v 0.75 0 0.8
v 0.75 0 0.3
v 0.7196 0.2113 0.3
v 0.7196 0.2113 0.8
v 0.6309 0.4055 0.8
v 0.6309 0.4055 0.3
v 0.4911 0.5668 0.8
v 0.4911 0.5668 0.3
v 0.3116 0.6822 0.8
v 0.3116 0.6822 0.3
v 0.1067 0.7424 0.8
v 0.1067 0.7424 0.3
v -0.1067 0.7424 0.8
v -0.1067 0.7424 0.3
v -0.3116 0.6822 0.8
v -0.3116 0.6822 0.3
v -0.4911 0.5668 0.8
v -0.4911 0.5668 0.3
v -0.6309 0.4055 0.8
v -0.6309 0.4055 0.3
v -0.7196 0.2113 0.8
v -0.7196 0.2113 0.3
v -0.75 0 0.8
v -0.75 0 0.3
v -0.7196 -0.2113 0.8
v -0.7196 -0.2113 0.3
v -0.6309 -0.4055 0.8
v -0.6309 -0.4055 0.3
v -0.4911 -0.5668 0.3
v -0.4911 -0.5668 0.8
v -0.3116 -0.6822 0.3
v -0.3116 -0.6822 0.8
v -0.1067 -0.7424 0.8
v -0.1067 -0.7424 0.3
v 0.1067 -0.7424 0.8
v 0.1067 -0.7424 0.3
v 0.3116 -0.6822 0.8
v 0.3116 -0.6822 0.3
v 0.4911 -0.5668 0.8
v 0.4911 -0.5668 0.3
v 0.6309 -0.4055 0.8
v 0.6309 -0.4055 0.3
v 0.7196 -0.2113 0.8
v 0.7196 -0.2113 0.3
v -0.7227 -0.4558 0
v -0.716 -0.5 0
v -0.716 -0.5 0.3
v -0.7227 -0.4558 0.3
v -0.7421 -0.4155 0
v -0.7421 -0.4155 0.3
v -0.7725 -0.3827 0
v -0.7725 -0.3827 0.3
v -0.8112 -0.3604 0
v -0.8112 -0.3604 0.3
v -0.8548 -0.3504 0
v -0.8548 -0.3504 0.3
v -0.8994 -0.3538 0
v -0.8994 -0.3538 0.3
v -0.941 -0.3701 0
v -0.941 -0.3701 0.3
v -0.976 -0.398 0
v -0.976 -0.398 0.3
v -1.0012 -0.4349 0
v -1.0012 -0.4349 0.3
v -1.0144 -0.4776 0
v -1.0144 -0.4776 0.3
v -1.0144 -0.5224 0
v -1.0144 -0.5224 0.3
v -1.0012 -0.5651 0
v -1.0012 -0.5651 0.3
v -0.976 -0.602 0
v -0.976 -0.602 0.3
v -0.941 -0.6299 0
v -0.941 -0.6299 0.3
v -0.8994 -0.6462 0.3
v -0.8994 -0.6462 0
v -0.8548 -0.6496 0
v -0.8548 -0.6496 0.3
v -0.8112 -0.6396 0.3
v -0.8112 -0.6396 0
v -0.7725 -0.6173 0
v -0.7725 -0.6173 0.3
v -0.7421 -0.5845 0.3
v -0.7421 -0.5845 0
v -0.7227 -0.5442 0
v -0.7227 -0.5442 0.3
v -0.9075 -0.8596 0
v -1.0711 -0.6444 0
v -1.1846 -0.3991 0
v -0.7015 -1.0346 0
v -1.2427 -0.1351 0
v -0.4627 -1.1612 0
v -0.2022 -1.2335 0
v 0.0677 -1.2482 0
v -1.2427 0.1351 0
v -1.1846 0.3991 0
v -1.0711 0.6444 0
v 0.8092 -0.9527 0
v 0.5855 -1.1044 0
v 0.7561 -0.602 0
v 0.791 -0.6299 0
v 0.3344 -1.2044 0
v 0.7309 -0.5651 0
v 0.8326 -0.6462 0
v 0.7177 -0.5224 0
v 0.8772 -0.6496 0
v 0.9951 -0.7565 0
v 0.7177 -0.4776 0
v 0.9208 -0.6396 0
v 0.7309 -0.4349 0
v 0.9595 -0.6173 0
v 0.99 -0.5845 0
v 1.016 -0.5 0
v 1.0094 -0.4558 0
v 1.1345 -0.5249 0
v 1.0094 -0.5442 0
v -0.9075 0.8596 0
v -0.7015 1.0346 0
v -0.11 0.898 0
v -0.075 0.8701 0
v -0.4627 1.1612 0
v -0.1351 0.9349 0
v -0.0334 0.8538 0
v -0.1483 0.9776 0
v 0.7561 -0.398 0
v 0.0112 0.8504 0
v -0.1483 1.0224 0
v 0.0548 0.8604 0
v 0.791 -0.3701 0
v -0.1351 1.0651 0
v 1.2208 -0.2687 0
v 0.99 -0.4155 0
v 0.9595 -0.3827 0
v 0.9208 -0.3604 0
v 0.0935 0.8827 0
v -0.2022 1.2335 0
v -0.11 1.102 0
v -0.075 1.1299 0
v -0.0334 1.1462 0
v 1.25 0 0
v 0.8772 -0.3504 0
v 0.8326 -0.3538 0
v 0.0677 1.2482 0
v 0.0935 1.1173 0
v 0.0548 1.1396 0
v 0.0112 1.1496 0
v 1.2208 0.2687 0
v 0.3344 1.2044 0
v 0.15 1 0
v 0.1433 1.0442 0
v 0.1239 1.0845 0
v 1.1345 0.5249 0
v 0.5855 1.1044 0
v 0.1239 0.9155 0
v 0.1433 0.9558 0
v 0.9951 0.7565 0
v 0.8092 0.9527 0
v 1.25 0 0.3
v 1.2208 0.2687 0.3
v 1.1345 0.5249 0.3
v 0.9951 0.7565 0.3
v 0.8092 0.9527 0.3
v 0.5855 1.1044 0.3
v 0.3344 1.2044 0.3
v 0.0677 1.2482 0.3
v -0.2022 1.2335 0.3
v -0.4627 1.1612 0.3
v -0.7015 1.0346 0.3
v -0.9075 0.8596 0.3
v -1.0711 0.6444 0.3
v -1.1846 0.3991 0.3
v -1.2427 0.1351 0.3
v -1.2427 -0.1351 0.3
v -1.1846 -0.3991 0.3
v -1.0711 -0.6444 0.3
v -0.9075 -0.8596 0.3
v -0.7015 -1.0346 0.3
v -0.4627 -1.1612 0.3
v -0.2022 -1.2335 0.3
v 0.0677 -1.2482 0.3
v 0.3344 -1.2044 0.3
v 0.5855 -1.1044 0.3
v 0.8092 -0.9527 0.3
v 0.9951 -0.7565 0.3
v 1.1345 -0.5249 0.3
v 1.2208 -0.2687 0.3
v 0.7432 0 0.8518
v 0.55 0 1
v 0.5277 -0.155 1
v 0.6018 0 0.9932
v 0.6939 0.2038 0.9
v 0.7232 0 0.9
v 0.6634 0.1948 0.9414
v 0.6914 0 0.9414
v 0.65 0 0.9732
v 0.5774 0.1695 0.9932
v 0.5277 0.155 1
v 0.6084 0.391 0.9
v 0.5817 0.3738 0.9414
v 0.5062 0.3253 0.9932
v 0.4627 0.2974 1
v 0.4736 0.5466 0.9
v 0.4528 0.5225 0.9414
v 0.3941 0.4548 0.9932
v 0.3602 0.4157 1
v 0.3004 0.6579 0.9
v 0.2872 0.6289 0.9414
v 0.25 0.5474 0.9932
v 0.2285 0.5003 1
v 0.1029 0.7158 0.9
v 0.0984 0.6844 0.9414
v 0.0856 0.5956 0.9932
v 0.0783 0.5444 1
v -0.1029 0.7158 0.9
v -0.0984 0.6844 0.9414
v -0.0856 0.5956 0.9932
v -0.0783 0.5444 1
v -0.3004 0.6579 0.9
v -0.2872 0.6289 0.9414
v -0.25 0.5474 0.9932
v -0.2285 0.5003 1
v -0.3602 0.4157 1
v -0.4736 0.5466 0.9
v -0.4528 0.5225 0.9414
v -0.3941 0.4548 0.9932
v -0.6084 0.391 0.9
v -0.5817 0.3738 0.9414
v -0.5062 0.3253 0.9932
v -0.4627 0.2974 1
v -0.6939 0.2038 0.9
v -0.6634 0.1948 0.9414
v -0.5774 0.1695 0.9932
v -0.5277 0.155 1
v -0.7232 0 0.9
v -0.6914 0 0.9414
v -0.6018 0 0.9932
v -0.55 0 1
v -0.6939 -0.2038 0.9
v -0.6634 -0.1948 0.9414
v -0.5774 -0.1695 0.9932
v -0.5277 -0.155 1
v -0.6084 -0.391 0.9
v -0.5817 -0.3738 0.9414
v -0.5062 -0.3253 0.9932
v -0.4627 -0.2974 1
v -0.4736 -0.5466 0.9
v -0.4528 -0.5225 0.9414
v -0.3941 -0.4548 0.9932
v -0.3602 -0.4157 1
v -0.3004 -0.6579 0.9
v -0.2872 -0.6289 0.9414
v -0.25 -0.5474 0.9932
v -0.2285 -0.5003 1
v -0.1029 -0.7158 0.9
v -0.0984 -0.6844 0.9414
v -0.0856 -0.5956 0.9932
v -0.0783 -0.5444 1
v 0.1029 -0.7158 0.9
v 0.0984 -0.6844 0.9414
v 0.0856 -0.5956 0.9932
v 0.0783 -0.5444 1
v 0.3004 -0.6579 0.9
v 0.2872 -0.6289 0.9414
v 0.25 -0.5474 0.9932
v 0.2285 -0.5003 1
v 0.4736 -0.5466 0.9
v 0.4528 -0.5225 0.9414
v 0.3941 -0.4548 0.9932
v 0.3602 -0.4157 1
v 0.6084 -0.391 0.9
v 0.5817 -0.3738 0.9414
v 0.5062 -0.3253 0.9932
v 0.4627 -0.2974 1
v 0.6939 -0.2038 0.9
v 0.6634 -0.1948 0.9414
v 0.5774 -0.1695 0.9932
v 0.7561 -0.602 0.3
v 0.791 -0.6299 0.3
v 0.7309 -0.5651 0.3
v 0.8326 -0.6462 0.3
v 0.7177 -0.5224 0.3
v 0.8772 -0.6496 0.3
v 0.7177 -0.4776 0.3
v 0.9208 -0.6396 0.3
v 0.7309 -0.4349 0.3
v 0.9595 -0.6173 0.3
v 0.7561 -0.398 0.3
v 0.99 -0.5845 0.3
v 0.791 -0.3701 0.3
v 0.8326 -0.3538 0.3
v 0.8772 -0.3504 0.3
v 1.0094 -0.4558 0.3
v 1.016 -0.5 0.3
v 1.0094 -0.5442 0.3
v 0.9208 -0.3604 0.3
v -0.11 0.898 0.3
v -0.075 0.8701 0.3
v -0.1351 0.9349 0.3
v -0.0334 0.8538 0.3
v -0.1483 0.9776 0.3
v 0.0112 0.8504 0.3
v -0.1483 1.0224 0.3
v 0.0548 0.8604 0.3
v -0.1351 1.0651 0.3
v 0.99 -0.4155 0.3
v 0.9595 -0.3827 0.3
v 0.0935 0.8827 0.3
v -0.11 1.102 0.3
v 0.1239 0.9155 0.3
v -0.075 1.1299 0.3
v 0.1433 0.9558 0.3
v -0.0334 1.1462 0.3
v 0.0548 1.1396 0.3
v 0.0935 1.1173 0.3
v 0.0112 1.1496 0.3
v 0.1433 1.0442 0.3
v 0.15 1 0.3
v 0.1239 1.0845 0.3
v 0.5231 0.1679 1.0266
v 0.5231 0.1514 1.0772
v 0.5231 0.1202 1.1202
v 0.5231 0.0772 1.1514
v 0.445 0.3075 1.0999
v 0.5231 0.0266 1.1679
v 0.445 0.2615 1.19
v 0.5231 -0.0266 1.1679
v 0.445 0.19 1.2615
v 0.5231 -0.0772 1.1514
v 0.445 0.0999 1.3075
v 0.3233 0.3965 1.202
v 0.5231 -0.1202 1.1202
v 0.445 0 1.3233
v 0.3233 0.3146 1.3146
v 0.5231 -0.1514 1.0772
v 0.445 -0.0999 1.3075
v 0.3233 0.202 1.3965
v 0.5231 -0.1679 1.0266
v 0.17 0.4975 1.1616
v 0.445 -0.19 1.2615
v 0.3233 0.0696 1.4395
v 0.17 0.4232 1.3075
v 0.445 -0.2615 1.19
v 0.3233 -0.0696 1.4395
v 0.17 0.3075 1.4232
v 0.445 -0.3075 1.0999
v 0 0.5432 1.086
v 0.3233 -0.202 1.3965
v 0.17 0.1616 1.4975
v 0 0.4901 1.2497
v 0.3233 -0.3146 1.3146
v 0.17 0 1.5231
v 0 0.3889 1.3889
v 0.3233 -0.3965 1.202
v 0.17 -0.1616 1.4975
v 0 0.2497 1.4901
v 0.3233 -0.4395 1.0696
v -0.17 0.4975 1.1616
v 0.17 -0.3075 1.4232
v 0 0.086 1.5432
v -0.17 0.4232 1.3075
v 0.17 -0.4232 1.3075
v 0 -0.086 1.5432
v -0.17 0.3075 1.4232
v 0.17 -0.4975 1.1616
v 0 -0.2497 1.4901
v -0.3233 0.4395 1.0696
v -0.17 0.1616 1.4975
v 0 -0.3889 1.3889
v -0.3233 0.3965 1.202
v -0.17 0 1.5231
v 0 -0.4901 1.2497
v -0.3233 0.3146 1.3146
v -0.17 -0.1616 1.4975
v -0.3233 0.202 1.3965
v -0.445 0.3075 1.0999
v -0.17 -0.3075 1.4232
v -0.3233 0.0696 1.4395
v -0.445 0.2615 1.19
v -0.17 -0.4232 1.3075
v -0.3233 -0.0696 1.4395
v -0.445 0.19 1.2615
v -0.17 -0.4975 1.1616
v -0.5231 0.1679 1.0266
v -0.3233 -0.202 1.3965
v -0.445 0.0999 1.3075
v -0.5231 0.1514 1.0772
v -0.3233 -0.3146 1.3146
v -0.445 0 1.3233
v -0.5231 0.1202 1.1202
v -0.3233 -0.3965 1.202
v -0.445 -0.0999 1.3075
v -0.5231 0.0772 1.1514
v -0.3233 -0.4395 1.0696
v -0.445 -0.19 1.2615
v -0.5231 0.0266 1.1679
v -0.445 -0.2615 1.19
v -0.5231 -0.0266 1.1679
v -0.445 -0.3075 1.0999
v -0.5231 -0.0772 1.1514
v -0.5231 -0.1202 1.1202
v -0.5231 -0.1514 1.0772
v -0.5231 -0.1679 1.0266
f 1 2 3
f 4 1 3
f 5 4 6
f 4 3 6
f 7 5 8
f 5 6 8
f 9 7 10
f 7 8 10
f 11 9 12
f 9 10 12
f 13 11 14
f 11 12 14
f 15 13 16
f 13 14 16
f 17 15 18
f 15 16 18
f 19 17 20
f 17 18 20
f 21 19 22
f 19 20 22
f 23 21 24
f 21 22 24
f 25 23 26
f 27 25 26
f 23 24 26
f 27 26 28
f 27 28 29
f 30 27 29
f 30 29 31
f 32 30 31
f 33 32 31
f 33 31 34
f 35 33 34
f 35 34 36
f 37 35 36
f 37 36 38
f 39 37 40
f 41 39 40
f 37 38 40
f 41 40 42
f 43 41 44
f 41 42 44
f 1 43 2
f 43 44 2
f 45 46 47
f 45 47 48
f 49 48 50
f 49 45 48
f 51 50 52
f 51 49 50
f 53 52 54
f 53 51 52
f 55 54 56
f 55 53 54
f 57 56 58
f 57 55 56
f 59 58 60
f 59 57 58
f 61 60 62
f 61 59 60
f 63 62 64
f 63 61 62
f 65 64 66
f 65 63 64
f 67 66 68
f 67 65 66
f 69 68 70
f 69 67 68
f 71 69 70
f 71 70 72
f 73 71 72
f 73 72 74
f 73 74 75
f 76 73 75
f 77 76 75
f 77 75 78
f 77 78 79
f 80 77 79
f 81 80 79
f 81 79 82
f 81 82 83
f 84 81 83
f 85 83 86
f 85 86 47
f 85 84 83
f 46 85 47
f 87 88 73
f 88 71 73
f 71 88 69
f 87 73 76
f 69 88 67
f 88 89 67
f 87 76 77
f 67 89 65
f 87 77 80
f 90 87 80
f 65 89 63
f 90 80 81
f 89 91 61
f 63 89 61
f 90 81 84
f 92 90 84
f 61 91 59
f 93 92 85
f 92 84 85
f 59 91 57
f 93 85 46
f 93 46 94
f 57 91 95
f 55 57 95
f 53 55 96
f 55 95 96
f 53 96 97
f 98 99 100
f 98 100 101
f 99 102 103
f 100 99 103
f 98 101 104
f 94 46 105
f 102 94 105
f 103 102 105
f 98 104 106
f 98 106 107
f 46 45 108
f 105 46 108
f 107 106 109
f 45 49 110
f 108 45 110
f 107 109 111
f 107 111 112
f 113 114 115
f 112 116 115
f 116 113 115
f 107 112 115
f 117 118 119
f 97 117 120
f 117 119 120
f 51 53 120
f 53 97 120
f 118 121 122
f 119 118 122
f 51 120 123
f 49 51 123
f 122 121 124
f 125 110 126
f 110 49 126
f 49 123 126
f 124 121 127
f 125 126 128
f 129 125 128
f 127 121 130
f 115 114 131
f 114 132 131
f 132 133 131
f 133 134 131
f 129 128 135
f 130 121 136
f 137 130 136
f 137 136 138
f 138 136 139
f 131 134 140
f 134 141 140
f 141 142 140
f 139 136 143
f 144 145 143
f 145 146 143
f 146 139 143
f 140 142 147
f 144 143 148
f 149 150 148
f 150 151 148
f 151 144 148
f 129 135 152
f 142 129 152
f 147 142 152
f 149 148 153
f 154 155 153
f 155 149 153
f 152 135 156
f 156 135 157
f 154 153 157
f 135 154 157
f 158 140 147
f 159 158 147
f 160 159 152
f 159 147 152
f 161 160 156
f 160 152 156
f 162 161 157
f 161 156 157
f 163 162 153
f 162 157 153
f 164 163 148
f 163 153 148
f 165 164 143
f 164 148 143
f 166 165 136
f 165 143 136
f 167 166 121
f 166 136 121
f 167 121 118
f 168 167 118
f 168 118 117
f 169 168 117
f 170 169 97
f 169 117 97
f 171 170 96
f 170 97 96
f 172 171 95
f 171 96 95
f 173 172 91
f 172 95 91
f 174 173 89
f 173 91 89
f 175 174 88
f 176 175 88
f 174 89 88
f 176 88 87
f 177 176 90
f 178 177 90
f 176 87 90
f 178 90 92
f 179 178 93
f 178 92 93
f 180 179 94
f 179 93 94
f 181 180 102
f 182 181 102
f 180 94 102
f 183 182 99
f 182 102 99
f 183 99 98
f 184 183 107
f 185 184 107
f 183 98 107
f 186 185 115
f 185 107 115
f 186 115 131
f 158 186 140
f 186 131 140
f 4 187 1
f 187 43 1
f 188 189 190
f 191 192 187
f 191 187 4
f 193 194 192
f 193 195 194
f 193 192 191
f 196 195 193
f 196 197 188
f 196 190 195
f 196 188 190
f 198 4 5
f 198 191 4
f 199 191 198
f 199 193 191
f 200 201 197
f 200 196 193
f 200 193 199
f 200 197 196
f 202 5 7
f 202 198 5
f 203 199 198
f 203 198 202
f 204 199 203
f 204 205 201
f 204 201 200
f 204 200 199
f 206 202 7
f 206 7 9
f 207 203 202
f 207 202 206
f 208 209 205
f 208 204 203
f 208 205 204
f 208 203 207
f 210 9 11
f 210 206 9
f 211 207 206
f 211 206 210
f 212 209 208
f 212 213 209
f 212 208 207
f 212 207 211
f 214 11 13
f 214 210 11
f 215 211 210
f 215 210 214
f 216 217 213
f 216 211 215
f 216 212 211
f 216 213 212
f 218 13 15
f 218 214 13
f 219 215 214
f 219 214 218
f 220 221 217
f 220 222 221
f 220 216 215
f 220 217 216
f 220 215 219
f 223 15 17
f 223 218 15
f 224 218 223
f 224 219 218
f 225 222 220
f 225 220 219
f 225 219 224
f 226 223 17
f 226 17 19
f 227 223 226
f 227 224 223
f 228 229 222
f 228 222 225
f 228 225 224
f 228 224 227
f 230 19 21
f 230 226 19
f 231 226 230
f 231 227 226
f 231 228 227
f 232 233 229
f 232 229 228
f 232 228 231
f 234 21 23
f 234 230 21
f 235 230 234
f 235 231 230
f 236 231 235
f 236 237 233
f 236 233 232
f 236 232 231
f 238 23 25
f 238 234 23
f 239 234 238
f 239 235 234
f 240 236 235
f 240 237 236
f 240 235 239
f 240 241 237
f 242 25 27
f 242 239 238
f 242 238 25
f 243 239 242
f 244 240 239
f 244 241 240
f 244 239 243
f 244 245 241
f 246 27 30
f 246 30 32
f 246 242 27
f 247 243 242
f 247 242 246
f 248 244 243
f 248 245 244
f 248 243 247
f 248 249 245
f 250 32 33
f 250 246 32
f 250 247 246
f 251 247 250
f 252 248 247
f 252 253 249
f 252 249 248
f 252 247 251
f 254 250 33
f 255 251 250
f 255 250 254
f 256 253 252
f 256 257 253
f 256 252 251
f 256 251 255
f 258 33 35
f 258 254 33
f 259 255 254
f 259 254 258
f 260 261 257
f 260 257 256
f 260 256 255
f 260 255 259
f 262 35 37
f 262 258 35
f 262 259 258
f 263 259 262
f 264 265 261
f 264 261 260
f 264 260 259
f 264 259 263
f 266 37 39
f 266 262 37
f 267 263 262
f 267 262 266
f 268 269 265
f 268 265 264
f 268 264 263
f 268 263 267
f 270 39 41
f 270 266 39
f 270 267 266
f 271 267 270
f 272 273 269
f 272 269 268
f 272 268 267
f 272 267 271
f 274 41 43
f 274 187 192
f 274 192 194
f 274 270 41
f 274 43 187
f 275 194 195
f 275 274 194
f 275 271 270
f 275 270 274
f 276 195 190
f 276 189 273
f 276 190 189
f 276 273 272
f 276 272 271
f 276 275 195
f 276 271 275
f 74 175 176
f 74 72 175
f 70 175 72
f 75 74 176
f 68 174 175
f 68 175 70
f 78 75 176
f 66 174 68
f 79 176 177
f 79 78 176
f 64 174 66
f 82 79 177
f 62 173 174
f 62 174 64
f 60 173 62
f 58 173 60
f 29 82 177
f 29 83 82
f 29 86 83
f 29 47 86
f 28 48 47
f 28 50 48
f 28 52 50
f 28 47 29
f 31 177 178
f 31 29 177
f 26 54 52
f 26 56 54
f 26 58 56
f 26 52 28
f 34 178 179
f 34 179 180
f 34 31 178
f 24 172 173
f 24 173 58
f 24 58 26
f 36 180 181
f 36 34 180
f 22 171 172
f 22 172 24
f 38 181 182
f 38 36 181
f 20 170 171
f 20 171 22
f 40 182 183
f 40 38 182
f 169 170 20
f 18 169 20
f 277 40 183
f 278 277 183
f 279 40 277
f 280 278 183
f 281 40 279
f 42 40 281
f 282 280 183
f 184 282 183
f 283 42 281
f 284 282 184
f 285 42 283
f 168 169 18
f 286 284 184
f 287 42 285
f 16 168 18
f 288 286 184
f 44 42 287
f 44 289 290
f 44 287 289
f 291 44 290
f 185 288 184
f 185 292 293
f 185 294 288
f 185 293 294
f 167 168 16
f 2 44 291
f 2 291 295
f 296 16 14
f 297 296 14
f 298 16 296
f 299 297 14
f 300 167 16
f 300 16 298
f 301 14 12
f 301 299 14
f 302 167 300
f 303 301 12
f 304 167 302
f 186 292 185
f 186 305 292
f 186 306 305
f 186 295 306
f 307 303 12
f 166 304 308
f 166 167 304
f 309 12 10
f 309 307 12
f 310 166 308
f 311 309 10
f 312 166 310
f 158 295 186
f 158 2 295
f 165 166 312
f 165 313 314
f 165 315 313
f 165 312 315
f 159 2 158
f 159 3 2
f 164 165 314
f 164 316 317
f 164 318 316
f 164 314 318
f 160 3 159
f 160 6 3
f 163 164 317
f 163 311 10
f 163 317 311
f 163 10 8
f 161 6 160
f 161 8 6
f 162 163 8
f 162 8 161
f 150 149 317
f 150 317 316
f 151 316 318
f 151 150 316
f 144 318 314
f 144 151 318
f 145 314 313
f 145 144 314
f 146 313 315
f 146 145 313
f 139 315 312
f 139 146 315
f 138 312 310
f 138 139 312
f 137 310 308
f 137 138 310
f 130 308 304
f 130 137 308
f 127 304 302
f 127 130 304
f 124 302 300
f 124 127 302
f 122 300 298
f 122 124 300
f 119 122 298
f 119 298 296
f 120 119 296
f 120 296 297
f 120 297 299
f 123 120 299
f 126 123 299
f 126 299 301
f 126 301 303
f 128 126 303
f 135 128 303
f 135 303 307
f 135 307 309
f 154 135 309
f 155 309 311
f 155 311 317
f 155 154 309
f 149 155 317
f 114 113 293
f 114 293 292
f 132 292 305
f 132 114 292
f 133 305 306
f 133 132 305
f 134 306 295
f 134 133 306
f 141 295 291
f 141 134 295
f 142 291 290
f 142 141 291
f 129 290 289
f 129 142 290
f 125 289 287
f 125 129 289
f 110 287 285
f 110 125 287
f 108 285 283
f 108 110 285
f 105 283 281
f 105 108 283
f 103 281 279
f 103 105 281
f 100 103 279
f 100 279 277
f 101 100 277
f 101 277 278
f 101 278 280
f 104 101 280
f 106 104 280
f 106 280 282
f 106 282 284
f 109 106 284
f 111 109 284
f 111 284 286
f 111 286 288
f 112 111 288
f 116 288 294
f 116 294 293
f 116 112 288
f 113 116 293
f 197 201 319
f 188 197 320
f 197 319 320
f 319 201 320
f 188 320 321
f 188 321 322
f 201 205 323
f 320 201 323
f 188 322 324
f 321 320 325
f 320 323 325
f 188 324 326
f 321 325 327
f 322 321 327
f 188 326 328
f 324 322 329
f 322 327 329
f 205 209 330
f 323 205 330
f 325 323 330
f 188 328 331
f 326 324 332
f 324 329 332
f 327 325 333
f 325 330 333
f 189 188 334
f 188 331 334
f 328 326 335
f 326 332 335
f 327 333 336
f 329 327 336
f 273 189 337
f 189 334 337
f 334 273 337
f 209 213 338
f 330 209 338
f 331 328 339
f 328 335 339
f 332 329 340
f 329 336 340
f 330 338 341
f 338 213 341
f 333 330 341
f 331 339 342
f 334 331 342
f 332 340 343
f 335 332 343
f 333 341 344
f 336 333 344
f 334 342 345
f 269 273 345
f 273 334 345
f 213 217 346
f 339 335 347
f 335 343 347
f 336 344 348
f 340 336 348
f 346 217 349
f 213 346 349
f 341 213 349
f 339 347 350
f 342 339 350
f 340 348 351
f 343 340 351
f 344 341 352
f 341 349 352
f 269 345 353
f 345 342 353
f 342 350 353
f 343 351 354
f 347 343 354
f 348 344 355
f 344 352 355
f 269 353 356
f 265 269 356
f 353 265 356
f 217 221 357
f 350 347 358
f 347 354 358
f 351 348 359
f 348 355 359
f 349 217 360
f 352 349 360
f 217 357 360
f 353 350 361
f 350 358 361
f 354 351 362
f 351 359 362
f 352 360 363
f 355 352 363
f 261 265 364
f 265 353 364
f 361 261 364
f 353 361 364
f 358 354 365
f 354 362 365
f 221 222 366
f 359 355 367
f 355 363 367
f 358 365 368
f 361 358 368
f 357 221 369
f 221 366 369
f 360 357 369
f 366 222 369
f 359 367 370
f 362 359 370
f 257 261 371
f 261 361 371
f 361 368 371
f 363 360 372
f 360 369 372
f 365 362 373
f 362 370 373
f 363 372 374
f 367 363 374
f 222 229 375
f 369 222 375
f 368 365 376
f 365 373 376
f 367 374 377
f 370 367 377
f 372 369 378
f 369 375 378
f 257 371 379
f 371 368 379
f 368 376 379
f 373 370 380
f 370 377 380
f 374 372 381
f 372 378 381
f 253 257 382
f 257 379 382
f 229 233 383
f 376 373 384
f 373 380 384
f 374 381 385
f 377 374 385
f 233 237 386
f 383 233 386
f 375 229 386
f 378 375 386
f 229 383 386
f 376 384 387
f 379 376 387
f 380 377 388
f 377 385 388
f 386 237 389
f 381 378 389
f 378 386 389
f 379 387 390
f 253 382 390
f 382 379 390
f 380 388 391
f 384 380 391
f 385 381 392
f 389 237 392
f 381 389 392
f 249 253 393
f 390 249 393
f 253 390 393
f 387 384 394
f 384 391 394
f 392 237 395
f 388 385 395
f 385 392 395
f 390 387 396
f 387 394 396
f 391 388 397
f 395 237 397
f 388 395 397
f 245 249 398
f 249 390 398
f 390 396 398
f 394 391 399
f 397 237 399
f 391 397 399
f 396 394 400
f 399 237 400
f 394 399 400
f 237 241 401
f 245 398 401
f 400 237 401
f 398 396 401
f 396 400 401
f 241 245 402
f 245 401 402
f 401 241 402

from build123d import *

# Parameters (mm, degrees)
SKETCH2_R           = 1.25
SKETCH2_R_2         = 0.15
BOSS_EXTRUDE1_DEPTH = 0.3
SKETCH3_R           = 0.75
BOSS_EXTRUDE2_DEPTH = 0.7
FILLET2_R           = 0.2


with BuildPart() as part:
    # Sketch2 → Boss-Extrude1 (new body)
    with BuildSketch(Plane.XY):
        Circle(SKETCH2_R)
        with Locations((0, 1)):
            Circle(SKETCH2_R_2, mode=Mode.SUBTRACT)
        with Locations((0.866025404, -0.5)):
            Circle(SKETCH2_R_2, mode=Mode.SUBTRACT)
        with Locations((-0.866025404, -0.5)):
            Circle(SKETCH2_R_2, mode=Mode.SUBTRACT)
    extrude(amount=BOSS_EXTRUDE1_DEPTH)

    # Sketch3 → Boss-Extrude2 (add)
    with BuildSketch(Plane.XY.offset(0.3)):
        Circle(SKETCH3_R)
    extrude(amount=BOSS_EXTRUDE2_DEPTH)

    # Fillet2
    fillet2_edges = [part.edges().sort_by_distance(p)[0] for p in [
        (-0.75, 0, 1),
    ]]
    fillet(fillet2_edges, radius=FILLET2_R)

    # Sketch5 → Revolve2 (revolve)
    with BuildSketch(Plane.XY.offset(1)):
        with BuildLine():
            Line((-0.55, 0), (0.55, 0))
            ThreePointArc((0.55, 0), (0, 0.55), (-0.55, 0))
        make_face()
    revolve(axis=Axis((-0.55, 0, 1), (1, 0, 0)))


solid = part.part
